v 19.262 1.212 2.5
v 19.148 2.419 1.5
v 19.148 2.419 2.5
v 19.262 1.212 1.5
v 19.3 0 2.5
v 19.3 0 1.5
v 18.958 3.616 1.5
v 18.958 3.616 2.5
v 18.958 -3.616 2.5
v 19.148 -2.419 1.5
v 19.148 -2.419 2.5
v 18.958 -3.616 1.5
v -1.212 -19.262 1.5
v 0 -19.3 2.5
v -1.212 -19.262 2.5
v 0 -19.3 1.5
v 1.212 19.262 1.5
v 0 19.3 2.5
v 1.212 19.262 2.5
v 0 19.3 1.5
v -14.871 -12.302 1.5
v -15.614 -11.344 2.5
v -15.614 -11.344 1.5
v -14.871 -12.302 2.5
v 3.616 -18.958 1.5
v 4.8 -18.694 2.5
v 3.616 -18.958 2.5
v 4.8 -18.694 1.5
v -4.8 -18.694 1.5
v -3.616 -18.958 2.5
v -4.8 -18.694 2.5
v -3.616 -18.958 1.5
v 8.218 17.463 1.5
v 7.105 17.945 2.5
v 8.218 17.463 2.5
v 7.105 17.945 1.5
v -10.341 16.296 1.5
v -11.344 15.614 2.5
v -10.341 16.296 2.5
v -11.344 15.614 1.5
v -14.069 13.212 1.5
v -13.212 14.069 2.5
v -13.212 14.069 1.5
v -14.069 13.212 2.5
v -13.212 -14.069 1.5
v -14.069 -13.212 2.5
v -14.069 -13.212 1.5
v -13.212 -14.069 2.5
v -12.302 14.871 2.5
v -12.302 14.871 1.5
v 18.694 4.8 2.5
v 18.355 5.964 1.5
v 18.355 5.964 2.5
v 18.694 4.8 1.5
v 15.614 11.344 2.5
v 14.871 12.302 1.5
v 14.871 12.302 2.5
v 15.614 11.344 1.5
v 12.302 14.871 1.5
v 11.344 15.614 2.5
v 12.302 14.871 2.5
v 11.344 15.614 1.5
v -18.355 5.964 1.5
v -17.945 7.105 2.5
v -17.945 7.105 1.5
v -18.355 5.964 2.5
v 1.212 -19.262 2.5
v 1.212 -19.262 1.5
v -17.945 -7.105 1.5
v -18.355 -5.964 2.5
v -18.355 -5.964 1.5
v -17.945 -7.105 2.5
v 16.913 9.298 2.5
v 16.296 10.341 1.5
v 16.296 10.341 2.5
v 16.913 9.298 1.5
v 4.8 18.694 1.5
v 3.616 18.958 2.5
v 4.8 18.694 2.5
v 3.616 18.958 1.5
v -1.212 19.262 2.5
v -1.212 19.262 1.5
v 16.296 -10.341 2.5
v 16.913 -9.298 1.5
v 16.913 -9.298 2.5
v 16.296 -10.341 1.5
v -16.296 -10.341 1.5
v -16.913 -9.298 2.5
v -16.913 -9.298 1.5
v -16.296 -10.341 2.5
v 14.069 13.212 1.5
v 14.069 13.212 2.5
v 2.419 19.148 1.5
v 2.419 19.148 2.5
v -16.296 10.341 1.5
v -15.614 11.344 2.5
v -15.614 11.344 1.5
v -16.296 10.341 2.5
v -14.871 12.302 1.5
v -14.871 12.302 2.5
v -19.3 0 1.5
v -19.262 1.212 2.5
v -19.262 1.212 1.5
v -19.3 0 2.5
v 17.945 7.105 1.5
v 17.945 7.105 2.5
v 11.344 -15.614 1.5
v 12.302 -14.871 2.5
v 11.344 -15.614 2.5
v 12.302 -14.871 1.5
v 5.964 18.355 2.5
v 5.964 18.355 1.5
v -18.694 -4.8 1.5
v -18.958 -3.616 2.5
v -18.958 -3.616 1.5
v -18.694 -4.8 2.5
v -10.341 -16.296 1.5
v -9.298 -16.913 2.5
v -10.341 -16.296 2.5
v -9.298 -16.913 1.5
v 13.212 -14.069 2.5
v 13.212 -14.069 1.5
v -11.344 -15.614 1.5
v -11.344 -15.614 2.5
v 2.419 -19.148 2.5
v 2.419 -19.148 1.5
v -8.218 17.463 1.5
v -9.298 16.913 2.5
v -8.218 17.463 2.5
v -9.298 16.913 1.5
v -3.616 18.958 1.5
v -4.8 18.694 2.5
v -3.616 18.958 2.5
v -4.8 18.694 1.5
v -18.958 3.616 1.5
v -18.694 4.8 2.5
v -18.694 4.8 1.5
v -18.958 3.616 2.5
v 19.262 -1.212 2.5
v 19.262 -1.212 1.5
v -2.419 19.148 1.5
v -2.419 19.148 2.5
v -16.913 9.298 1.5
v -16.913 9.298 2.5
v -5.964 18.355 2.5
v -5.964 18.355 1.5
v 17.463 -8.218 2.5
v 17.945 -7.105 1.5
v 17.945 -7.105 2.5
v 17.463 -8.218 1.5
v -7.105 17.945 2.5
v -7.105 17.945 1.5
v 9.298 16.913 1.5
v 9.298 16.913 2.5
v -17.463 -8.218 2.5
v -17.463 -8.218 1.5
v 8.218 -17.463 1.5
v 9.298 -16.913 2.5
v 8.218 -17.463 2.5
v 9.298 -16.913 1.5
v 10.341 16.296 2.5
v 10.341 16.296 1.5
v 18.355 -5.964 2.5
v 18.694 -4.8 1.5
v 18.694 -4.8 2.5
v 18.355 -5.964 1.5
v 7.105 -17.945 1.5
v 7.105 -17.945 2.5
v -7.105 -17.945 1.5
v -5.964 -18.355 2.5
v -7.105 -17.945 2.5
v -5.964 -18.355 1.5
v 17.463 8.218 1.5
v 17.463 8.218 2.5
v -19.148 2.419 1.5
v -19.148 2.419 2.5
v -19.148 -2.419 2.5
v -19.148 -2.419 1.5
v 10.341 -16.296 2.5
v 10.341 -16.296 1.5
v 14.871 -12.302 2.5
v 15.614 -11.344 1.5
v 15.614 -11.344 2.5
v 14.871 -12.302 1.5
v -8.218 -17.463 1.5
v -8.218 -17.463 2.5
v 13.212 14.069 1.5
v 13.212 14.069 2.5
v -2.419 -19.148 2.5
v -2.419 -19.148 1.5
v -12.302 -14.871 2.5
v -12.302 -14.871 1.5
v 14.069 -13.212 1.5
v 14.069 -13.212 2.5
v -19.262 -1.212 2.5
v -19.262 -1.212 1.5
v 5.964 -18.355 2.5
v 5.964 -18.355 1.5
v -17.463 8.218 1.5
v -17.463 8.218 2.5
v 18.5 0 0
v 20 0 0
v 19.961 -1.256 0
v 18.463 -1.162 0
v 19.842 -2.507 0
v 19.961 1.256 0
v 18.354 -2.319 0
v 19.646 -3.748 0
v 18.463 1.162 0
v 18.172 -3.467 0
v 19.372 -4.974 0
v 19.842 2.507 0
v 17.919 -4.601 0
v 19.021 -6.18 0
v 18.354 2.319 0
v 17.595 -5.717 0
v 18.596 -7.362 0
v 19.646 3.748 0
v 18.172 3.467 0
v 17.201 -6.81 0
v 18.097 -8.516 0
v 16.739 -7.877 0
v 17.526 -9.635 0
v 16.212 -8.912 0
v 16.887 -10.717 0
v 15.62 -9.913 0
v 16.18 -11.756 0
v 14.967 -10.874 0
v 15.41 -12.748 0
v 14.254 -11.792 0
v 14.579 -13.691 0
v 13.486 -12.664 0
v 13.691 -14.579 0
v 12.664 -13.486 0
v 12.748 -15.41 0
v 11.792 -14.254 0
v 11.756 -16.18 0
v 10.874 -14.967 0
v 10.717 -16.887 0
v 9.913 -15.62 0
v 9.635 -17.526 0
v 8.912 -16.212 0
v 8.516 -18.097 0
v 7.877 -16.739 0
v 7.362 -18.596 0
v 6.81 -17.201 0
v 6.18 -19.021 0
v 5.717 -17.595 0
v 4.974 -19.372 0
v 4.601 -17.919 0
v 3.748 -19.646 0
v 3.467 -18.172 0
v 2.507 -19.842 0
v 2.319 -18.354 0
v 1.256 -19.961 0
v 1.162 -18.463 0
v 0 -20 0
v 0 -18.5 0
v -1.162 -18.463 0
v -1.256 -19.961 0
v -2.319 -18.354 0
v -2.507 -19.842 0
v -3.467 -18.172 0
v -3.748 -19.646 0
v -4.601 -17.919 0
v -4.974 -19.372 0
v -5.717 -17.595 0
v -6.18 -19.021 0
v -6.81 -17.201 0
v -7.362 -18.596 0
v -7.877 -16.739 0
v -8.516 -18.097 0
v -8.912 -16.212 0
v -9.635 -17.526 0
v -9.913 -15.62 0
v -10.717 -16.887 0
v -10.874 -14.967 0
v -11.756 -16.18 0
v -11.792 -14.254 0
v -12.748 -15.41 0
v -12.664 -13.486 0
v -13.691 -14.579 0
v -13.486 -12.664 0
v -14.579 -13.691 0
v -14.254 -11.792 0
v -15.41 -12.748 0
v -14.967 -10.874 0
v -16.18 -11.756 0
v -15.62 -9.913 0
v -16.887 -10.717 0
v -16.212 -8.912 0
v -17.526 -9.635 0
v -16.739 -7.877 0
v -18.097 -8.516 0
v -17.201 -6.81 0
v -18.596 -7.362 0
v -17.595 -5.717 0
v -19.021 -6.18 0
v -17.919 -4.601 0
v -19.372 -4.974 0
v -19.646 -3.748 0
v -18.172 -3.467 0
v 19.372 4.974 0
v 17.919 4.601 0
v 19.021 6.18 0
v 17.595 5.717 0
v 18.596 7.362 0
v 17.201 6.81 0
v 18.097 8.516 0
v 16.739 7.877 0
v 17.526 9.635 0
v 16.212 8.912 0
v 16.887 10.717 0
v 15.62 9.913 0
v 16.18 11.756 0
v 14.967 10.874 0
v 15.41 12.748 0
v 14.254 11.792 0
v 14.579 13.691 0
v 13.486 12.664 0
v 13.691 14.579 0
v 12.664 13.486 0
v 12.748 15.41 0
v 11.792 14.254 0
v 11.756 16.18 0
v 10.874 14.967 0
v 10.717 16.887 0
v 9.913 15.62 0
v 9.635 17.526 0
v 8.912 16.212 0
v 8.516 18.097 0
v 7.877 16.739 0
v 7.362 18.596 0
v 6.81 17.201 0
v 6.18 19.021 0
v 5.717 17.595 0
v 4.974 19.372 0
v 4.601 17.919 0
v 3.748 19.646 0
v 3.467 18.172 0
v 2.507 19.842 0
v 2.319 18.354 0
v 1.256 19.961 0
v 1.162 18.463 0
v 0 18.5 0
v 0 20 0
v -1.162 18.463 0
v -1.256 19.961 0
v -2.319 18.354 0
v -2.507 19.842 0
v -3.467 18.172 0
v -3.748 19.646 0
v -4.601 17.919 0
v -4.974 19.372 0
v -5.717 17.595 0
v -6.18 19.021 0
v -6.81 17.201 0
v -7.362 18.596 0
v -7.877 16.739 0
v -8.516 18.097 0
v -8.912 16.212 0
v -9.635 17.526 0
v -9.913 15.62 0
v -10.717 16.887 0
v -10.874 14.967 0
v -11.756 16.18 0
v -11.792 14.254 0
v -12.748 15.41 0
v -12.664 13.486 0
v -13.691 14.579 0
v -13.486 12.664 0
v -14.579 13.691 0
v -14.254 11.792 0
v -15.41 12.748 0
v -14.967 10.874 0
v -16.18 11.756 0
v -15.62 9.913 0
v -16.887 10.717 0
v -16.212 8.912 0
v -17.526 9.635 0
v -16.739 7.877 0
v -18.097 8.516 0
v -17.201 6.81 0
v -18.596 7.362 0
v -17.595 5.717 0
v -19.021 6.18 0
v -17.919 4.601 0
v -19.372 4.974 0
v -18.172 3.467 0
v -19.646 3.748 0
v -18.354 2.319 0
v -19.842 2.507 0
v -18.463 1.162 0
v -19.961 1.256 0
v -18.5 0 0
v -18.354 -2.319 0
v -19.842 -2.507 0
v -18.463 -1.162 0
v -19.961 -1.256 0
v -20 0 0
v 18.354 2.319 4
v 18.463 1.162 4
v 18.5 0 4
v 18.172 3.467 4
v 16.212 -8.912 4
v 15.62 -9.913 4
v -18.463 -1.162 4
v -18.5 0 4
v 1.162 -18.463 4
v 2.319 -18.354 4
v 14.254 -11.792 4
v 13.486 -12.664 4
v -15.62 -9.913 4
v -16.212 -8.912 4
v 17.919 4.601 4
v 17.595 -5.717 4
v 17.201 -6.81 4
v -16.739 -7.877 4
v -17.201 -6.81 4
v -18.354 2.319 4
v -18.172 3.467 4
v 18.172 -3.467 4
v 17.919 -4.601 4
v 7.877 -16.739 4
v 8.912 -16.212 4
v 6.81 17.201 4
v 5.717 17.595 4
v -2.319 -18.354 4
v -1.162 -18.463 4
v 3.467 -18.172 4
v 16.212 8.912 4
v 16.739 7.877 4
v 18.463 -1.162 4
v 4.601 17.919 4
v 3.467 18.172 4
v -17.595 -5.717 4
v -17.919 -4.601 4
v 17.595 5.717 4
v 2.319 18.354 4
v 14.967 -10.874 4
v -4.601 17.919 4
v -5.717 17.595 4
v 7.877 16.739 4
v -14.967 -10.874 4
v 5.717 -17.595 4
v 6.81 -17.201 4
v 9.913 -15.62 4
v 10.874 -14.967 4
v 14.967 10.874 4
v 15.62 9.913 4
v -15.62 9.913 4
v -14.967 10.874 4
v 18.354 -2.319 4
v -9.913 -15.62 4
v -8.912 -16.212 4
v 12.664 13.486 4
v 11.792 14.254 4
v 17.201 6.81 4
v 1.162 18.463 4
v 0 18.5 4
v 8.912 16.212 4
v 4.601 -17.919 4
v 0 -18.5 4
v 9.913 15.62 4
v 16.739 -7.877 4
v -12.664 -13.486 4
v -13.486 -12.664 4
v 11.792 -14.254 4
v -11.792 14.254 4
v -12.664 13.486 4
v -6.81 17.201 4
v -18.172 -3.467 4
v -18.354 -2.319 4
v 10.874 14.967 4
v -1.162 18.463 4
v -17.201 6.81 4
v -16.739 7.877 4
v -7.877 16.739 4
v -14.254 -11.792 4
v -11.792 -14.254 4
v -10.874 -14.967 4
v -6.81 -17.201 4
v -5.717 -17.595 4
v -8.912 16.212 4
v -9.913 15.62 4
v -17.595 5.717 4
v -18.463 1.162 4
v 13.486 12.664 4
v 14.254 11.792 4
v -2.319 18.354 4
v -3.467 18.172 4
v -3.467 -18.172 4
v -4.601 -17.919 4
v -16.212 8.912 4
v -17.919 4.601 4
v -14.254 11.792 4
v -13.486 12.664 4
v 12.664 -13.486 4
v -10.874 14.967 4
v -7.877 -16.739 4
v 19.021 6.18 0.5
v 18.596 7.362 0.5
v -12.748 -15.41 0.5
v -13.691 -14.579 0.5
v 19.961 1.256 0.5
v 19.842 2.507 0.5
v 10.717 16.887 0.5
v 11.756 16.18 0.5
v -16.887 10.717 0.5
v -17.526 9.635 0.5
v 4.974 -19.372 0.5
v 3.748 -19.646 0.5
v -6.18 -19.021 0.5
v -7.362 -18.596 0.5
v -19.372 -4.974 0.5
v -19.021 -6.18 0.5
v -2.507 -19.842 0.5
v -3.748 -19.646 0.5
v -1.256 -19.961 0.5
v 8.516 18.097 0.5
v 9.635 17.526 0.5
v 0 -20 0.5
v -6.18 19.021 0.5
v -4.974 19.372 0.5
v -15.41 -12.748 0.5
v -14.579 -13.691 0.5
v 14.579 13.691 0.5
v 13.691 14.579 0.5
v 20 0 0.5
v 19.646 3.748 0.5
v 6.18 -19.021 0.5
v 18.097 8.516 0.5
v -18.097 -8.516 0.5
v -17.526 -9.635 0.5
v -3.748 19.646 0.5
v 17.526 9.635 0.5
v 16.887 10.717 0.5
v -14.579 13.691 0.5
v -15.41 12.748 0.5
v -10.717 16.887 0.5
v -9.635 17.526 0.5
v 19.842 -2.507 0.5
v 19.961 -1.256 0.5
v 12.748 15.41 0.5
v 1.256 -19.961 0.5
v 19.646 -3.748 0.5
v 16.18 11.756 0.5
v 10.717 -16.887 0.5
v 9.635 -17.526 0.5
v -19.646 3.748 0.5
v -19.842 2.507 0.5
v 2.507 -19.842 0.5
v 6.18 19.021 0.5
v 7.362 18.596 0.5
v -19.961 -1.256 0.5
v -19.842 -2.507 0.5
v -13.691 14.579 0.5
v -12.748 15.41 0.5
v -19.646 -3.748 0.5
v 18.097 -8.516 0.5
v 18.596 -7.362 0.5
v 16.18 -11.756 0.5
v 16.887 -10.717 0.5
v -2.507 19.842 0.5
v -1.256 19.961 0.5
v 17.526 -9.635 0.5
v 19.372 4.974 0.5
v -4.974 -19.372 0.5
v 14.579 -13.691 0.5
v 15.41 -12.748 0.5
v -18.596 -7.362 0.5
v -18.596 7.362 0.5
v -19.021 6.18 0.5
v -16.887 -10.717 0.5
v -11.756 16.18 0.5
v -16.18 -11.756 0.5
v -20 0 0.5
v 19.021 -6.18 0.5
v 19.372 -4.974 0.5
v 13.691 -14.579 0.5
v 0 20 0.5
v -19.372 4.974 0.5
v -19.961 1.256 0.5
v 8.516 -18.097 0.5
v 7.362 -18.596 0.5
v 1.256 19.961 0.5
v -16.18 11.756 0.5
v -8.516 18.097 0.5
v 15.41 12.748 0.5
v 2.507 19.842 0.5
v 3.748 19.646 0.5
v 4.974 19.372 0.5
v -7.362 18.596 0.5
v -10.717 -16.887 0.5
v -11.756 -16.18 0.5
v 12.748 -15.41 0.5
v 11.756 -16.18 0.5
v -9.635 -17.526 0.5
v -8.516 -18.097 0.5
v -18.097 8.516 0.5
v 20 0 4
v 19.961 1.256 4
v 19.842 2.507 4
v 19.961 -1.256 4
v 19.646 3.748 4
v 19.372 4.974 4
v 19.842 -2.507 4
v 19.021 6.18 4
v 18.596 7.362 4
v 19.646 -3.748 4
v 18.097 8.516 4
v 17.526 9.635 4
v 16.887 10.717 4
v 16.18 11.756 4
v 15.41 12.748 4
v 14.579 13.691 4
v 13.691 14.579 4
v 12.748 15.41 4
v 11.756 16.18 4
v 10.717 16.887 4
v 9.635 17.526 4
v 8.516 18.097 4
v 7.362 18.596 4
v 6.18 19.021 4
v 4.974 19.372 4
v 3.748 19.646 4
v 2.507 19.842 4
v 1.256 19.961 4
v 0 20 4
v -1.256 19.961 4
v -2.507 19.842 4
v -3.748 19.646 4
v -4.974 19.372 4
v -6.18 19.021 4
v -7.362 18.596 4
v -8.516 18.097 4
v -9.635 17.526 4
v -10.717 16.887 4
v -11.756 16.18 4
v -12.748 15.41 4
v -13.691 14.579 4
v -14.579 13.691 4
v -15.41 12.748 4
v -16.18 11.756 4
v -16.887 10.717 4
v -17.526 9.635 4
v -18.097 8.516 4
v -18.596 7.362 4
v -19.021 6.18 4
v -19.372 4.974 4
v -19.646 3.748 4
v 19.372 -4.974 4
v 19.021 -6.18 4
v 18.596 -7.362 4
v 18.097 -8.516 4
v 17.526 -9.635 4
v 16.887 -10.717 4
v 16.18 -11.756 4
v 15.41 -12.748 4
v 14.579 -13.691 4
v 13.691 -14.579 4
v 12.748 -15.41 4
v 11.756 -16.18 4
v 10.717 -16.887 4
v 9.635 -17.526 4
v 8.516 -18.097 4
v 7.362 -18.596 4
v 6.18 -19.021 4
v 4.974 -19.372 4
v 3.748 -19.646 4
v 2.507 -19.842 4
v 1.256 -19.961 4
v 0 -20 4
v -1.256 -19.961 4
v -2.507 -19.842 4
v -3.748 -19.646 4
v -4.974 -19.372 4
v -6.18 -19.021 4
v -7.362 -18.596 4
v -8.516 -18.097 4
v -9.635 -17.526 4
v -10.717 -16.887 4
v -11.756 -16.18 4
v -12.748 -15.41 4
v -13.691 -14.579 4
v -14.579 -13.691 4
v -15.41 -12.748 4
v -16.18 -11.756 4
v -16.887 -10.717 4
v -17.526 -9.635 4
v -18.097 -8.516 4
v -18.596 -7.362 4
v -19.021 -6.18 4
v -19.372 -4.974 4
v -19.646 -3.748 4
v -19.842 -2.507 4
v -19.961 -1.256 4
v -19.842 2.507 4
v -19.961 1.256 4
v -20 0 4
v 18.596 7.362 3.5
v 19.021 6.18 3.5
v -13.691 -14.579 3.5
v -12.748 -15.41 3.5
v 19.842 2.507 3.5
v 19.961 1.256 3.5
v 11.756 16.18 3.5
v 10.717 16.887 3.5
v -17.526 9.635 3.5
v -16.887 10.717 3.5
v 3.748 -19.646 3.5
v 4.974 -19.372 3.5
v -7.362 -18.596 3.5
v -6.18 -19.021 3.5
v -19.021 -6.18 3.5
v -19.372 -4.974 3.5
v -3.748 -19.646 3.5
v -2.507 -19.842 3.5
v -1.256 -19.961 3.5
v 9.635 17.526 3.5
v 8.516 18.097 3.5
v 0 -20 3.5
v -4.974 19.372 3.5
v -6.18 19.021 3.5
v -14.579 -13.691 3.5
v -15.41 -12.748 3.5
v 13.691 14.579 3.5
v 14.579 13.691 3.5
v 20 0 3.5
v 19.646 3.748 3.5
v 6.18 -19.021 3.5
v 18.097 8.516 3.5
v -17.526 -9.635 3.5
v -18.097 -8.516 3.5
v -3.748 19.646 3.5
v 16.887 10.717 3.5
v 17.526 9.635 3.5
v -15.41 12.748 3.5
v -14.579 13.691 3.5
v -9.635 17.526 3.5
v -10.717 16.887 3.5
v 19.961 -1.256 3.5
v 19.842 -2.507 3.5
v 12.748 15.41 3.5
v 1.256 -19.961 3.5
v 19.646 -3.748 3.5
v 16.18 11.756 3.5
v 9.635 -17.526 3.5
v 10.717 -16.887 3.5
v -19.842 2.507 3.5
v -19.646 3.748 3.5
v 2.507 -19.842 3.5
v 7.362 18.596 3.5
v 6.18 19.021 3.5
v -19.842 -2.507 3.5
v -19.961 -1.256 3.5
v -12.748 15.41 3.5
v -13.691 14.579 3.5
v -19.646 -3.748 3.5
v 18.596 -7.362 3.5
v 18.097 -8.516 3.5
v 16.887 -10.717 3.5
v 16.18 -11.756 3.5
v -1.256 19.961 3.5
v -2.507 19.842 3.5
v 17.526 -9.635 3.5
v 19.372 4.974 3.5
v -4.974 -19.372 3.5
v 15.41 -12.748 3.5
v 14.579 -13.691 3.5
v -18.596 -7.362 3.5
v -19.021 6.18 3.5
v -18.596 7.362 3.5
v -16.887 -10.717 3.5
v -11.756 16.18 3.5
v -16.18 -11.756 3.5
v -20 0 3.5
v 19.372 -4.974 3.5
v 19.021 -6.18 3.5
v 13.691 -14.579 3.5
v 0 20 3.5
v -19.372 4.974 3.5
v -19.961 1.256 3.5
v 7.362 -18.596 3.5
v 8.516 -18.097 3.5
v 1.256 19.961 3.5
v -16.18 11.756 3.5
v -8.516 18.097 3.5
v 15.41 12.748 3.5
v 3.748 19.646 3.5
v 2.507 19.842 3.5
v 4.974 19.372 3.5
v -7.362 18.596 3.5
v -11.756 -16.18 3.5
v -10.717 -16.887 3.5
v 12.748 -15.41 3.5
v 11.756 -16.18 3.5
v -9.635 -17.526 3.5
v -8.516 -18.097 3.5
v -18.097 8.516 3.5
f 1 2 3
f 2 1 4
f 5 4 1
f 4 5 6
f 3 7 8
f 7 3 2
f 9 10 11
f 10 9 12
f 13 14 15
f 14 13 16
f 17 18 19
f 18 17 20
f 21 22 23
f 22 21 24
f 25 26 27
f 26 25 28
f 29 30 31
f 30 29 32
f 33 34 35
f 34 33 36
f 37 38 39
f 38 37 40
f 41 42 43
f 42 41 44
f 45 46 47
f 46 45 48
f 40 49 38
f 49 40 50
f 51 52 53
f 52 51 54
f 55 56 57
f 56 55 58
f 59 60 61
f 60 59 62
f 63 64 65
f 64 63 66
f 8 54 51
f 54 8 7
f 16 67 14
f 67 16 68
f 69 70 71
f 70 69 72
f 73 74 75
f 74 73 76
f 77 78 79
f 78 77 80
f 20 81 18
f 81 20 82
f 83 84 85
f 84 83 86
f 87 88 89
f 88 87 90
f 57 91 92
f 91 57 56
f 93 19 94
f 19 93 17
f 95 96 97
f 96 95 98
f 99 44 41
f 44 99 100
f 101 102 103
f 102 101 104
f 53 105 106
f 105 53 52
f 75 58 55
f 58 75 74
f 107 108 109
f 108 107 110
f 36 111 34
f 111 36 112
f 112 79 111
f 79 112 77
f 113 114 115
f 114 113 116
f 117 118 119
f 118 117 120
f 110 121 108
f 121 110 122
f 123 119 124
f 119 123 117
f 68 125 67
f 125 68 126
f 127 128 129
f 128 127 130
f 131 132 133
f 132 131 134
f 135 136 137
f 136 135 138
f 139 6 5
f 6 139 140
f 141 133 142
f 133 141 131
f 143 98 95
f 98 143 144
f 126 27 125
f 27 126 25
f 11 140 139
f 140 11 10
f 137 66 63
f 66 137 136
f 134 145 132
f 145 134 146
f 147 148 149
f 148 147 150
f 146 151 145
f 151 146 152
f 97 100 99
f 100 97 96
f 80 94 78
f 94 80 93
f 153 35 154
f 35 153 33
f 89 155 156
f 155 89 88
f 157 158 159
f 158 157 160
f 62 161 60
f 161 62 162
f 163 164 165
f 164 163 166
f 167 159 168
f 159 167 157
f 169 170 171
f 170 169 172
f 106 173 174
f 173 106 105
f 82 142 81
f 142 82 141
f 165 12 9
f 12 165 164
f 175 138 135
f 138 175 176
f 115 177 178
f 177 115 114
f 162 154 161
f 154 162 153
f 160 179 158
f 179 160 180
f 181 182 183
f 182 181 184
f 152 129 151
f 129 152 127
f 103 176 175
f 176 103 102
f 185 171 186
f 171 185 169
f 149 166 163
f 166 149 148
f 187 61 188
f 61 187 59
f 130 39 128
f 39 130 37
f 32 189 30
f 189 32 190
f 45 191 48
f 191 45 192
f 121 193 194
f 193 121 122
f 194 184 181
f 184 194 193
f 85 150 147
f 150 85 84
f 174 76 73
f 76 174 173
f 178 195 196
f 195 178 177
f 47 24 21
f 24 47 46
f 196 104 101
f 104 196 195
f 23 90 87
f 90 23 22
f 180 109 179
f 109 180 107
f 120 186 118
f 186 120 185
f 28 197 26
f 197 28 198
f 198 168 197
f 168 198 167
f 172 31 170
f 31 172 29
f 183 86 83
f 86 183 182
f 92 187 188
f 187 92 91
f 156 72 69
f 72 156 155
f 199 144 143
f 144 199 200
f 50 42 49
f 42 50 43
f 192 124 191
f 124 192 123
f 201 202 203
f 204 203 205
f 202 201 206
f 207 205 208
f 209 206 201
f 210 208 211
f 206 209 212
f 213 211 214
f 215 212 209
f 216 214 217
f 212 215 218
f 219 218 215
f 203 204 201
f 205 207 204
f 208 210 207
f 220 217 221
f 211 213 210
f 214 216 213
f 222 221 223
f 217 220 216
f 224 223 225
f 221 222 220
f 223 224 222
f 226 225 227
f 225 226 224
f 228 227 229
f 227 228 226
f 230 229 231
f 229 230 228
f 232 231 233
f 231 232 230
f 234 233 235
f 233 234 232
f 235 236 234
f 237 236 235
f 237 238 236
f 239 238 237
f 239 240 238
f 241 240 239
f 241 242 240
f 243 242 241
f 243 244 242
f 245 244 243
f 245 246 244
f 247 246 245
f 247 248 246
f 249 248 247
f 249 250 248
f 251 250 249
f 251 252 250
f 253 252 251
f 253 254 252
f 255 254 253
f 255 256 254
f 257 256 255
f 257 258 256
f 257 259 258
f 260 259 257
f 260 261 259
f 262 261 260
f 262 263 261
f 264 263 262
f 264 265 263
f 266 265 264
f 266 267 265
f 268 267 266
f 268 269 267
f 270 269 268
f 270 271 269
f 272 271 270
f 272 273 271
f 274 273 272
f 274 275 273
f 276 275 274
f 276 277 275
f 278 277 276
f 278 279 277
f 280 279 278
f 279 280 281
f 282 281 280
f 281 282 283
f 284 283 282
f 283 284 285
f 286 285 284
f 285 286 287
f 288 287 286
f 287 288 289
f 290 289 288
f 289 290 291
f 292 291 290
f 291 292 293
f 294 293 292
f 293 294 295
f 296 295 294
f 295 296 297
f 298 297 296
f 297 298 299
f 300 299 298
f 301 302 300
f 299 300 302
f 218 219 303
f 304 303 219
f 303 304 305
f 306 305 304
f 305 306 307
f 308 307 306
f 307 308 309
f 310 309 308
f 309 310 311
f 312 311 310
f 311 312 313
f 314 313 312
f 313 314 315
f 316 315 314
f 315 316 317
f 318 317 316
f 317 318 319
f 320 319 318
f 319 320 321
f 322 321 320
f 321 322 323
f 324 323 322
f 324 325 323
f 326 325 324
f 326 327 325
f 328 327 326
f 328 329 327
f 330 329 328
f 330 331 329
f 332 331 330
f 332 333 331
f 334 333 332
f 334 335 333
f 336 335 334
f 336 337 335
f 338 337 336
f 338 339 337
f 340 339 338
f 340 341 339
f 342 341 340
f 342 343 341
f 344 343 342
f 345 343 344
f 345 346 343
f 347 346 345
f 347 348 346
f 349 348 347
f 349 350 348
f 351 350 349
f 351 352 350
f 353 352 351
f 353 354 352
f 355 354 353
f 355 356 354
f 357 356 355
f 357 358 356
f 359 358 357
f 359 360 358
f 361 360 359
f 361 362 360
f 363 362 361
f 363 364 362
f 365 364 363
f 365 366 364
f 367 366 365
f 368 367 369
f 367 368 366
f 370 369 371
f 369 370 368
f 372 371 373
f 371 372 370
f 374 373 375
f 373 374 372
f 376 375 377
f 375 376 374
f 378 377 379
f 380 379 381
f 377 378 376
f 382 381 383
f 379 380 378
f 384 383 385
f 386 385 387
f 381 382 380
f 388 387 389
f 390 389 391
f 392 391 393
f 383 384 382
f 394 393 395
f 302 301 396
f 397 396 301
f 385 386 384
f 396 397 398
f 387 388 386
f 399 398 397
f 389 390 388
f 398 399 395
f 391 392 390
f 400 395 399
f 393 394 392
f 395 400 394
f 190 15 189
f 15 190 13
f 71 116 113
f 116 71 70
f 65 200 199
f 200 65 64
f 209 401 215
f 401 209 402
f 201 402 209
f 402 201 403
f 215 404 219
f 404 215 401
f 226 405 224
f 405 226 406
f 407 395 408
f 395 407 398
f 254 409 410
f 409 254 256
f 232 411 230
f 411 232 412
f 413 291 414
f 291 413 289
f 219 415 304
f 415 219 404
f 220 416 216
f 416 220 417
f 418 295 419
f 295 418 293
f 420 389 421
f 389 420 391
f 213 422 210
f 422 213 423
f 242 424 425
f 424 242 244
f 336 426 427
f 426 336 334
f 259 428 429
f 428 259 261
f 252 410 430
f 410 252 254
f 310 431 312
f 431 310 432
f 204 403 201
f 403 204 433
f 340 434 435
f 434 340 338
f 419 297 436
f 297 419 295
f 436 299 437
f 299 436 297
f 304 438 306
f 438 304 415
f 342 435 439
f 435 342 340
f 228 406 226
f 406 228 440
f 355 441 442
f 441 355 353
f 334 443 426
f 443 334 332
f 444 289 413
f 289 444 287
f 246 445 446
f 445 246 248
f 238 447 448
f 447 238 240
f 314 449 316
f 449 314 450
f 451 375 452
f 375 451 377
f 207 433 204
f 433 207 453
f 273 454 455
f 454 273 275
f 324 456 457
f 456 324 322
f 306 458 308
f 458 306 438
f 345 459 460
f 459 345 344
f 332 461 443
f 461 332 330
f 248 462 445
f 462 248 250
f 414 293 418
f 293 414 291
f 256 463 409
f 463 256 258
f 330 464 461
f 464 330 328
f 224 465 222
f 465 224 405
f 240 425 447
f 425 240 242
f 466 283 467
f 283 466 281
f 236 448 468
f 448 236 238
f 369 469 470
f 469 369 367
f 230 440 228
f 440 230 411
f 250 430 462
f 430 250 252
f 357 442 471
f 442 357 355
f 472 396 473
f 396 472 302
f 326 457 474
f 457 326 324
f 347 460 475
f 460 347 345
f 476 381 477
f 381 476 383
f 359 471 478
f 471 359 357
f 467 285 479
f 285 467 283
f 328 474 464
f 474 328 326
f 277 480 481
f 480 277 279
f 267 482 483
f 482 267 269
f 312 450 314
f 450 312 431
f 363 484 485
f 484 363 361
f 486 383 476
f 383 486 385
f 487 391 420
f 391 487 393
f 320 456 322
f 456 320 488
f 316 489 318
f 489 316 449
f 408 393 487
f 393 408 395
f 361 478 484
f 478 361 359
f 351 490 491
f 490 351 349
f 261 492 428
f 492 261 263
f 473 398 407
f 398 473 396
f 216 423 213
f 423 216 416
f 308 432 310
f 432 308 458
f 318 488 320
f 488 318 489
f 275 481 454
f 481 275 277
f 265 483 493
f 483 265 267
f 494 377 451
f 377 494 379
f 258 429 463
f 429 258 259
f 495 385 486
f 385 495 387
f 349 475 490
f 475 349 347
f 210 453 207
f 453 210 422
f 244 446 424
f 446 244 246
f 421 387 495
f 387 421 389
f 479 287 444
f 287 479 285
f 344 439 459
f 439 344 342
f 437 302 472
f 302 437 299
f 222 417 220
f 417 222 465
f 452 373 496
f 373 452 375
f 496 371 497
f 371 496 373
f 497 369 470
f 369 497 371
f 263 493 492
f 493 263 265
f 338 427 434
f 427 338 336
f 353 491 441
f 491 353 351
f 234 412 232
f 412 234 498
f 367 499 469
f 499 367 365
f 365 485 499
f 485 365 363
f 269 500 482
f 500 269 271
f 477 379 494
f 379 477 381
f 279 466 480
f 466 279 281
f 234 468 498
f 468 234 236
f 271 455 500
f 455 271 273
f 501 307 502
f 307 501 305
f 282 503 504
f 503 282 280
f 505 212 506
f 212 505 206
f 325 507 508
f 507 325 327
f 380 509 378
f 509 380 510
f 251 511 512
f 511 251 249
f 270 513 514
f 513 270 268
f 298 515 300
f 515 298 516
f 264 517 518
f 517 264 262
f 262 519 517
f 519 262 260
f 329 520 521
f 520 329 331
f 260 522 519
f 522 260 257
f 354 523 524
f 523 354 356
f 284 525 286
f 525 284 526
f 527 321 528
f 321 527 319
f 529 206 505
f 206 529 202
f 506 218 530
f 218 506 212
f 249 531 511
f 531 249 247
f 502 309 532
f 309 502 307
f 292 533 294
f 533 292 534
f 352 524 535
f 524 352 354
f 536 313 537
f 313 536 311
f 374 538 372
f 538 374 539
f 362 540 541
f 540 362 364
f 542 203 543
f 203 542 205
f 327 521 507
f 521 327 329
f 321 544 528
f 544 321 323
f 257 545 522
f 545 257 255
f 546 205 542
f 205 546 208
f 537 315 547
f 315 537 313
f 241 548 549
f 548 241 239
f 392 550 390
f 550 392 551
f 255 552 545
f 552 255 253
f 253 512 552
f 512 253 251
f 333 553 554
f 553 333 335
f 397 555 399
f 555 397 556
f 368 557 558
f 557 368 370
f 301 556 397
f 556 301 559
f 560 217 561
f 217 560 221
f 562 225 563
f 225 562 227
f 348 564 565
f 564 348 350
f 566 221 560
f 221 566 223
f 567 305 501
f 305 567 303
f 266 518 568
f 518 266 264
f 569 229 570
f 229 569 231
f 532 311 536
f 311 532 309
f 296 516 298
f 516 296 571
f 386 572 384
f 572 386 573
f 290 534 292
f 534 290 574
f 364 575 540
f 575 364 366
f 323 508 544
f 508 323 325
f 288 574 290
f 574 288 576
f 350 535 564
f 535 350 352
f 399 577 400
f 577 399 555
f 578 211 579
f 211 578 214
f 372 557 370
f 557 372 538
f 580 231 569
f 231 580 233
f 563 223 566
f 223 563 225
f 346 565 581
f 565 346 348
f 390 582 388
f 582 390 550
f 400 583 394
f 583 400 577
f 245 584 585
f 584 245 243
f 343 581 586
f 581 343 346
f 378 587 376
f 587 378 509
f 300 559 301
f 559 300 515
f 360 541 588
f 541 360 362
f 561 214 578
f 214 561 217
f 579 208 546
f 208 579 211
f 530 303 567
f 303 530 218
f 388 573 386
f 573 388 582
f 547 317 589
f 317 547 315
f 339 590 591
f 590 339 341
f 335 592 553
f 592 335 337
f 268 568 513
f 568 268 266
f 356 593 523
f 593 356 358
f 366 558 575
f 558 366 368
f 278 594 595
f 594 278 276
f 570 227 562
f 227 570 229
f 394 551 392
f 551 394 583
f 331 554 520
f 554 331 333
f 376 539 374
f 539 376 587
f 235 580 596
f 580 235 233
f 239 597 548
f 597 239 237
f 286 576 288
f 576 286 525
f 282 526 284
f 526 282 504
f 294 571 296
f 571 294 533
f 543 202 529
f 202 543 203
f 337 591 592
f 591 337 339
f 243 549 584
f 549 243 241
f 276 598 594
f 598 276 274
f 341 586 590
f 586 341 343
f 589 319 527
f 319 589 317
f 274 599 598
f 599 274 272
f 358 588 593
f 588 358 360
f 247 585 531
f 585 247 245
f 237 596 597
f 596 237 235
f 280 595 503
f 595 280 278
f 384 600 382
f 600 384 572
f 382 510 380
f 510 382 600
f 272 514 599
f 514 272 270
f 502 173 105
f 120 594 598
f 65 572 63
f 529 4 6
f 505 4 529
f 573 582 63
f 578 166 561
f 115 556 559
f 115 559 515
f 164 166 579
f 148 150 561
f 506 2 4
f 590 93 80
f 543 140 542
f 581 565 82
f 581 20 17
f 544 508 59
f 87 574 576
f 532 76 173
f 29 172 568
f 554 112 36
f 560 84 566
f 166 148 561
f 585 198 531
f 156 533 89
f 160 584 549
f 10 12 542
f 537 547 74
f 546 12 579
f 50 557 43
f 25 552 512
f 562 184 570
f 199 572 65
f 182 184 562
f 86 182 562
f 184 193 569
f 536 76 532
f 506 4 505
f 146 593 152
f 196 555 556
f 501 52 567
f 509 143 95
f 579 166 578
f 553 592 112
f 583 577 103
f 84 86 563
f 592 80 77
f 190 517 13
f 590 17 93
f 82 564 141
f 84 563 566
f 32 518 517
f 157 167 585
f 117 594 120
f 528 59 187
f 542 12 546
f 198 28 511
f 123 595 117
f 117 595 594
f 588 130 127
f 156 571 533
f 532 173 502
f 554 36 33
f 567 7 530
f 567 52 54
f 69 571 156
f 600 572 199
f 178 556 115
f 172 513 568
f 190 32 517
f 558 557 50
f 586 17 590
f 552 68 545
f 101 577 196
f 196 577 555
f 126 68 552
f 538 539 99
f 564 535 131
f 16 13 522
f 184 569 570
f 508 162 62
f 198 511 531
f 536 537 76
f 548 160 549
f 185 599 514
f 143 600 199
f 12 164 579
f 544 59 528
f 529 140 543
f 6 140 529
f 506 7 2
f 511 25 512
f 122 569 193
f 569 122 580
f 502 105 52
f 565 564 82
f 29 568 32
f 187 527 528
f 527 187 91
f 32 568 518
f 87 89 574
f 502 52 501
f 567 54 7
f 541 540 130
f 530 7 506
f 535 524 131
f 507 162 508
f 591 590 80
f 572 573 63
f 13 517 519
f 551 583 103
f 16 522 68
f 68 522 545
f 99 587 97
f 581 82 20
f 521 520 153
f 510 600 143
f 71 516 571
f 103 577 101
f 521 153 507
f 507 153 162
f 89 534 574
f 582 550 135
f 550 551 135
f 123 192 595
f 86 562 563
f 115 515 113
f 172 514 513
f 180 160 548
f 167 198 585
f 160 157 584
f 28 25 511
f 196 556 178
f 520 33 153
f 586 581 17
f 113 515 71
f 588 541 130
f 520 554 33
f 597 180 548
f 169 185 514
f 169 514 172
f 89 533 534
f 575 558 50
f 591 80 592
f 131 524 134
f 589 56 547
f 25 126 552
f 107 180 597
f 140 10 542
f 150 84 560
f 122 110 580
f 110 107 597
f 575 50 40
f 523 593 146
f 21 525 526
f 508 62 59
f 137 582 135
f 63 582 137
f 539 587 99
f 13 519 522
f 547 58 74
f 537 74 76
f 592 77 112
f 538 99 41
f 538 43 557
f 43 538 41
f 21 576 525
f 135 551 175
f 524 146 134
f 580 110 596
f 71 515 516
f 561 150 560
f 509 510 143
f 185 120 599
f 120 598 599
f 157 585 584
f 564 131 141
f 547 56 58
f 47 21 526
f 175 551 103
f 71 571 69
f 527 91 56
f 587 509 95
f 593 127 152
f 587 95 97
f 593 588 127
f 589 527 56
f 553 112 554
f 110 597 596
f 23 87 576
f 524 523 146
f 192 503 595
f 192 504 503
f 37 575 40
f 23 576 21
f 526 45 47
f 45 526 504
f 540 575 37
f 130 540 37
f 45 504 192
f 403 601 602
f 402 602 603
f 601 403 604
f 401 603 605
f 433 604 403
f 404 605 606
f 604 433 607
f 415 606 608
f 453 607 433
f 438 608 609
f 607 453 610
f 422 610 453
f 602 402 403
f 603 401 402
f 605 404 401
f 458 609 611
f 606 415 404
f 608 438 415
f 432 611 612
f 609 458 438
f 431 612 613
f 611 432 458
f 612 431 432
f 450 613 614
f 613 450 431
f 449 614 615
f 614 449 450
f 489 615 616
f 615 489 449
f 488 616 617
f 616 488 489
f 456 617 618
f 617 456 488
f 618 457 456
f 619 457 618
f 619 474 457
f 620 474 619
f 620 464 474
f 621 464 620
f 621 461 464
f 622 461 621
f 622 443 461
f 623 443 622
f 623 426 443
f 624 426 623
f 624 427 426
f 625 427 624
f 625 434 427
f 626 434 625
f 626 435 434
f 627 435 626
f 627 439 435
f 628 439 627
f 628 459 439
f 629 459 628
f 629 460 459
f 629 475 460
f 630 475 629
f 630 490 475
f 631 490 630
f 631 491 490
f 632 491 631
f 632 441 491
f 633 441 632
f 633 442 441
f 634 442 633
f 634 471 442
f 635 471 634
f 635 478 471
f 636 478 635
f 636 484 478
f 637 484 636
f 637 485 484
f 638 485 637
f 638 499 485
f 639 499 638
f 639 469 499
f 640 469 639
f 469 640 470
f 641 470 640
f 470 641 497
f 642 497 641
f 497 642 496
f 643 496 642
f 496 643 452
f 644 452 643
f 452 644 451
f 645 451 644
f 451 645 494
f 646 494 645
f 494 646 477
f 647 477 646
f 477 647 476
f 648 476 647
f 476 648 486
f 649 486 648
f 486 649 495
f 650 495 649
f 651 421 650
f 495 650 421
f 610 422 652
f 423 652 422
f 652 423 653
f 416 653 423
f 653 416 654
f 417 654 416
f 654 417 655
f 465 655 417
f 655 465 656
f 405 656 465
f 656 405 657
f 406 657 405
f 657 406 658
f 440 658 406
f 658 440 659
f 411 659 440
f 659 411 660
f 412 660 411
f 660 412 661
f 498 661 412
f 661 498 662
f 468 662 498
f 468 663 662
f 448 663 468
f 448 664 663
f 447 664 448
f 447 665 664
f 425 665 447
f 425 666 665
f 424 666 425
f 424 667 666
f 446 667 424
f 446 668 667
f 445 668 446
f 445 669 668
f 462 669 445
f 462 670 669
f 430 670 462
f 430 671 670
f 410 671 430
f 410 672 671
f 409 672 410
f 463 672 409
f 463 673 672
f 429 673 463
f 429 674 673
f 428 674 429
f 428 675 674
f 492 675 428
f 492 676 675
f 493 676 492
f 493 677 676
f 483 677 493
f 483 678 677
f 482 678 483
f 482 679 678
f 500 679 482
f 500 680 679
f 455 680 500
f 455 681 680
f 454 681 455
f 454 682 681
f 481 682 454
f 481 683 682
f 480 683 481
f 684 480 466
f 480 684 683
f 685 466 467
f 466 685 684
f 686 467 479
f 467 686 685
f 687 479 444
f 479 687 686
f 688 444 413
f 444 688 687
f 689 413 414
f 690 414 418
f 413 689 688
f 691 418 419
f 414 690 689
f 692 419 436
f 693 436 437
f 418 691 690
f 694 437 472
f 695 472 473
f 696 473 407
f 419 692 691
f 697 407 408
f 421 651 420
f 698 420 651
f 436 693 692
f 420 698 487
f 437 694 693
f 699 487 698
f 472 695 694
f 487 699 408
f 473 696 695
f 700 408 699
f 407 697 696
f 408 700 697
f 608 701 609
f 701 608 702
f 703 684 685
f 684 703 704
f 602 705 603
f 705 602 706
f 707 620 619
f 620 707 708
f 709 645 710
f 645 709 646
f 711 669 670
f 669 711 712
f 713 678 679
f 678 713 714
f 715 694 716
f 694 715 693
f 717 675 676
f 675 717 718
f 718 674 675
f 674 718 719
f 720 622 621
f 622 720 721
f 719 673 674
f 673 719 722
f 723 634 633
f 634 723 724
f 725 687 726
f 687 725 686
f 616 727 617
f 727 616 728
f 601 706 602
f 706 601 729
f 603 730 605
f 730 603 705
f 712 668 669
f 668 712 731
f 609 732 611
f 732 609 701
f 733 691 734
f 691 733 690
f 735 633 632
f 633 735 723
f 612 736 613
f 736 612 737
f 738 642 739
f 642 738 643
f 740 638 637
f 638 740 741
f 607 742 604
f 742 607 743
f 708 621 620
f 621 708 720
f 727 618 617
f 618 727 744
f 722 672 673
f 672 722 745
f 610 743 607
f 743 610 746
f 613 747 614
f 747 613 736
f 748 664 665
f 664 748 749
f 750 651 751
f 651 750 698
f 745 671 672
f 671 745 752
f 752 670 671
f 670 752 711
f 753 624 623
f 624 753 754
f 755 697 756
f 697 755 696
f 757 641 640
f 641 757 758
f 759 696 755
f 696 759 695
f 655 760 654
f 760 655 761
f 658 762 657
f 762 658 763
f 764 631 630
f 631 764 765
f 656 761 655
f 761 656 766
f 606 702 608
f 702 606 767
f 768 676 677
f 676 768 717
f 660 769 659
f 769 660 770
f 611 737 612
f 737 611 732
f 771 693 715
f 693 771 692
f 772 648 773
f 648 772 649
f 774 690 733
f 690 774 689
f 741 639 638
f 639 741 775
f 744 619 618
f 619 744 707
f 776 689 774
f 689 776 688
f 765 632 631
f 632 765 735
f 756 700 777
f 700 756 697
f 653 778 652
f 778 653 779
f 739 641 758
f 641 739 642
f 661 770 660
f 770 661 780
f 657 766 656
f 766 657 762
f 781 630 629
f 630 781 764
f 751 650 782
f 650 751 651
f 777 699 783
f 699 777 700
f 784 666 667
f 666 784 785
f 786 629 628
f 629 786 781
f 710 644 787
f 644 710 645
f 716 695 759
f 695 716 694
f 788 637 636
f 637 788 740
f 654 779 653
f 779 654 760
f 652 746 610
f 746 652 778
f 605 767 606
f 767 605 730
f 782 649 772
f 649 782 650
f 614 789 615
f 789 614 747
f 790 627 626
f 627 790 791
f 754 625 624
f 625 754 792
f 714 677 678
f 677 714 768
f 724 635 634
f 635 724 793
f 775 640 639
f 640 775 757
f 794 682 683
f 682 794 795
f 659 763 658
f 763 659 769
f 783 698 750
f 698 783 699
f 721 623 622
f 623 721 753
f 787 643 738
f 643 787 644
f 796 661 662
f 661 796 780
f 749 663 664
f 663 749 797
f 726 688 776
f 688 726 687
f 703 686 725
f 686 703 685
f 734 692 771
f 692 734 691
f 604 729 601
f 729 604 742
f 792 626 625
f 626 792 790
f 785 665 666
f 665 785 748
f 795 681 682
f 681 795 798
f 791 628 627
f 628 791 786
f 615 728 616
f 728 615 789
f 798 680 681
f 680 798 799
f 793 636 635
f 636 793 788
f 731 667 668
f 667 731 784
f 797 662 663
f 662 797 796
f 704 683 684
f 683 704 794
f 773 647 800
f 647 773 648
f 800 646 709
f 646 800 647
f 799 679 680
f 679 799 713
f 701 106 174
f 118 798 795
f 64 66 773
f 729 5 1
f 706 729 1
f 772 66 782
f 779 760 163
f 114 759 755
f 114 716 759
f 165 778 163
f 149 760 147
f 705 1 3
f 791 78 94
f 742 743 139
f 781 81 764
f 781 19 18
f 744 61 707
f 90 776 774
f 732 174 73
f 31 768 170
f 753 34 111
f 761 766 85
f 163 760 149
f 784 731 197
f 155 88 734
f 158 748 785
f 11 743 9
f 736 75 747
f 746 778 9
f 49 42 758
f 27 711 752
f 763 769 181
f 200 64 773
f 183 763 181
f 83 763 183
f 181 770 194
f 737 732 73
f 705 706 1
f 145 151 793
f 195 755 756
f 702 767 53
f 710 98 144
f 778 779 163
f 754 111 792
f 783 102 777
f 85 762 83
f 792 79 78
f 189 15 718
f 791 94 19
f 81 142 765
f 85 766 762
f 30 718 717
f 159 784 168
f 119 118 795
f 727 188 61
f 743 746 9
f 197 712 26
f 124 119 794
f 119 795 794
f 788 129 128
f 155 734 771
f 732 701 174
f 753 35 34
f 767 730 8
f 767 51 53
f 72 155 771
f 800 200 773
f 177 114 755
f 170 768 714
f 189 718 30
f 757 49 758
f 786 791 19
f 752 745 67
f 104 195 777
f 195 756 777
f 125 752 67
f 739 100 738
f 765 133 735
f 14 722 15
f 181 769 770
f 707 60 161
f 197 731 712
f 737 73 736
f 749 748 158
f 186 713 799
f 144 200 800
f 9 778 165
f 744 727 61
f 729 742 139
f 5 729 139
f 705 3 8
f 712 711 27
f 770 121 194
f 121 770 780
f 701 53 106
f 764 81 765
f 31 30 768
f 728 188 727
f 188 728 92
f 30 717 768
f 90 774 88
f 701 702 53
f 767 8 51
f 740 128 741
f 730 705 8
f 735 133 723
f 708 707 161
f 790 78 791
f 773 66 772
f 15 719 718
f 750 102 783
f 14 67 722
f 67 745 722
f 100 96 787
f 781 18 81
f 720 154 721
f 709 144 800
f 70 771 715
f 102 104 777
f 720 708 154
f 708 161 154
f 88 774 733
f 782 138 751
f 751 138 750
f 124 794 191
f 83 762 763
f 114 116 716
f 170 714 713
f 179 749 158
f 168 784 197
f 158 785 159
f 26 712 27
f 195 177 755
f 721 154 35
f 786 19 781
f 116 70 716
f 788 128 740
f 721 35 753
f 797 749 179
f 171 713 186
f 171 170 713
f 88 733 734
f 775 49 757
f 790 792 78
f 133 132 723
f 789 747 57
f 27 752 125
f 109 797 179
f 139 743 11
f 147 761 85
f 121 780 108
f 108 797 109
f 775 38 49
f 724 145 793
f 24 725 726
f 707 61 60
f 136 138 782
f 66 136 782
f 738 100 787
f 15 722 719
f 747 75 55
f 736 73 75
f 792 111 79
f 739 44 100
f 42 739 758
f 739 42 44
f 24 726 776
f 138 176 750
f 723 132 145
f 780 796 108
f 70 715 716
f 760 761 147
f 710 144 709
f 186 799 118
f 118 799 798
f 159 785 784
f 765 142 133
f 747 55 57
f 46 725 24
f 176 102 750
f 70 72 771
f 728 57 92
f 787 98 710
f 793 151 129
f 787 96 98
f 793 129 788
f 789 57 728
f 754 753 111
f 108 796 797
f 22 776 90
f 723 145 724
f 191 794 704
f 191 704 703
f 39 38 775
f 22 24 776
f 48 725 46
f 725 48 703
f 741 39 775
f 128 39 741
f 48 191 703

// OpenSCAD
/* 

	simple pulley

	2015 by ChrisMicro

*/
$fn=100;

pulleyInnerDiameter = 37;
pulleyOuterDiameter = 40;
pulleyThickness     = 4;

rimDeepnes          = 0.7; // Rillentiefe
rimBootomWith       = 1; // Rillenbreite unten
rimTopWith          = 3; // Rillenbreite oben


pulley(	pulleyInnerDiameter,
					pulleyOuterDiameter,
					pulleyThickness,
					rimDeepnes,
					rimBootomWith,
					rimTopWith	);

module pulley(	pulleyInnerDiameter,
					pulleyOuterDiameter,
					pulleyThickness,
					rimDeepnes,
					rimBootomWith,
					rimTopWith	)
{
	halfPulley(pulleyInnerDiameter,pulleyOuterDiameter,pulleyThickness,rimDeepnes,rimBootomWith,rimTopWith);
	translate([0,0,pulleyThickness]) mirror([0,0,1])
		halfPulley(pulleyInnerDiameter,pulleyOuterDiameter,pulleyThickness,rimDeepnes,rimBootomWith,rimTopWith);
}

module halfPulley(	pulleyInnerDiameter,
						pulleyOuterDiameter,
						pulleyThickness,
						rimDeepnes,
						rimBootomWith,
						rimTopWith	)
{
	// 1. inner Ring
	washer(pulleyThickness/2,pulleyInnerDiameter,pulleyOuterDiameter-rimDeepnes*2);

	// 2. outer edge ring
	flThickness=(pulleyThickness-rimTopWith)/2; 
	washer(flThickness,pulleyInnerDiameter,pulleyOuterDiameter);

	// 3. bevel ring ( Schrägflächen Ring)
	brThickness=pulleyThickness/2-flThickness-rimBootomWith/2;

	brInnerDiameter=pulleyOuterDiameter-rimDeepnes*2;
	
	brYPos=flThickness;
	
	translate([0,0,brYPos])
		difference()
		{
			cylinder(h=brThickness,r2=brInnerDiameter/2,r1=pulleyOuterDiameter/2);
			cylinder(h=brThickness,r=brInnerDiameter/2);
		}
}

module washer(thickness,innerDiameter,outerDiameter)
{
	difference()
	{
		cylinder(h=thickness,r=outerDiameter/2);
		cylinder(h=thickness,r=innerDiameter/2);
	}
}
